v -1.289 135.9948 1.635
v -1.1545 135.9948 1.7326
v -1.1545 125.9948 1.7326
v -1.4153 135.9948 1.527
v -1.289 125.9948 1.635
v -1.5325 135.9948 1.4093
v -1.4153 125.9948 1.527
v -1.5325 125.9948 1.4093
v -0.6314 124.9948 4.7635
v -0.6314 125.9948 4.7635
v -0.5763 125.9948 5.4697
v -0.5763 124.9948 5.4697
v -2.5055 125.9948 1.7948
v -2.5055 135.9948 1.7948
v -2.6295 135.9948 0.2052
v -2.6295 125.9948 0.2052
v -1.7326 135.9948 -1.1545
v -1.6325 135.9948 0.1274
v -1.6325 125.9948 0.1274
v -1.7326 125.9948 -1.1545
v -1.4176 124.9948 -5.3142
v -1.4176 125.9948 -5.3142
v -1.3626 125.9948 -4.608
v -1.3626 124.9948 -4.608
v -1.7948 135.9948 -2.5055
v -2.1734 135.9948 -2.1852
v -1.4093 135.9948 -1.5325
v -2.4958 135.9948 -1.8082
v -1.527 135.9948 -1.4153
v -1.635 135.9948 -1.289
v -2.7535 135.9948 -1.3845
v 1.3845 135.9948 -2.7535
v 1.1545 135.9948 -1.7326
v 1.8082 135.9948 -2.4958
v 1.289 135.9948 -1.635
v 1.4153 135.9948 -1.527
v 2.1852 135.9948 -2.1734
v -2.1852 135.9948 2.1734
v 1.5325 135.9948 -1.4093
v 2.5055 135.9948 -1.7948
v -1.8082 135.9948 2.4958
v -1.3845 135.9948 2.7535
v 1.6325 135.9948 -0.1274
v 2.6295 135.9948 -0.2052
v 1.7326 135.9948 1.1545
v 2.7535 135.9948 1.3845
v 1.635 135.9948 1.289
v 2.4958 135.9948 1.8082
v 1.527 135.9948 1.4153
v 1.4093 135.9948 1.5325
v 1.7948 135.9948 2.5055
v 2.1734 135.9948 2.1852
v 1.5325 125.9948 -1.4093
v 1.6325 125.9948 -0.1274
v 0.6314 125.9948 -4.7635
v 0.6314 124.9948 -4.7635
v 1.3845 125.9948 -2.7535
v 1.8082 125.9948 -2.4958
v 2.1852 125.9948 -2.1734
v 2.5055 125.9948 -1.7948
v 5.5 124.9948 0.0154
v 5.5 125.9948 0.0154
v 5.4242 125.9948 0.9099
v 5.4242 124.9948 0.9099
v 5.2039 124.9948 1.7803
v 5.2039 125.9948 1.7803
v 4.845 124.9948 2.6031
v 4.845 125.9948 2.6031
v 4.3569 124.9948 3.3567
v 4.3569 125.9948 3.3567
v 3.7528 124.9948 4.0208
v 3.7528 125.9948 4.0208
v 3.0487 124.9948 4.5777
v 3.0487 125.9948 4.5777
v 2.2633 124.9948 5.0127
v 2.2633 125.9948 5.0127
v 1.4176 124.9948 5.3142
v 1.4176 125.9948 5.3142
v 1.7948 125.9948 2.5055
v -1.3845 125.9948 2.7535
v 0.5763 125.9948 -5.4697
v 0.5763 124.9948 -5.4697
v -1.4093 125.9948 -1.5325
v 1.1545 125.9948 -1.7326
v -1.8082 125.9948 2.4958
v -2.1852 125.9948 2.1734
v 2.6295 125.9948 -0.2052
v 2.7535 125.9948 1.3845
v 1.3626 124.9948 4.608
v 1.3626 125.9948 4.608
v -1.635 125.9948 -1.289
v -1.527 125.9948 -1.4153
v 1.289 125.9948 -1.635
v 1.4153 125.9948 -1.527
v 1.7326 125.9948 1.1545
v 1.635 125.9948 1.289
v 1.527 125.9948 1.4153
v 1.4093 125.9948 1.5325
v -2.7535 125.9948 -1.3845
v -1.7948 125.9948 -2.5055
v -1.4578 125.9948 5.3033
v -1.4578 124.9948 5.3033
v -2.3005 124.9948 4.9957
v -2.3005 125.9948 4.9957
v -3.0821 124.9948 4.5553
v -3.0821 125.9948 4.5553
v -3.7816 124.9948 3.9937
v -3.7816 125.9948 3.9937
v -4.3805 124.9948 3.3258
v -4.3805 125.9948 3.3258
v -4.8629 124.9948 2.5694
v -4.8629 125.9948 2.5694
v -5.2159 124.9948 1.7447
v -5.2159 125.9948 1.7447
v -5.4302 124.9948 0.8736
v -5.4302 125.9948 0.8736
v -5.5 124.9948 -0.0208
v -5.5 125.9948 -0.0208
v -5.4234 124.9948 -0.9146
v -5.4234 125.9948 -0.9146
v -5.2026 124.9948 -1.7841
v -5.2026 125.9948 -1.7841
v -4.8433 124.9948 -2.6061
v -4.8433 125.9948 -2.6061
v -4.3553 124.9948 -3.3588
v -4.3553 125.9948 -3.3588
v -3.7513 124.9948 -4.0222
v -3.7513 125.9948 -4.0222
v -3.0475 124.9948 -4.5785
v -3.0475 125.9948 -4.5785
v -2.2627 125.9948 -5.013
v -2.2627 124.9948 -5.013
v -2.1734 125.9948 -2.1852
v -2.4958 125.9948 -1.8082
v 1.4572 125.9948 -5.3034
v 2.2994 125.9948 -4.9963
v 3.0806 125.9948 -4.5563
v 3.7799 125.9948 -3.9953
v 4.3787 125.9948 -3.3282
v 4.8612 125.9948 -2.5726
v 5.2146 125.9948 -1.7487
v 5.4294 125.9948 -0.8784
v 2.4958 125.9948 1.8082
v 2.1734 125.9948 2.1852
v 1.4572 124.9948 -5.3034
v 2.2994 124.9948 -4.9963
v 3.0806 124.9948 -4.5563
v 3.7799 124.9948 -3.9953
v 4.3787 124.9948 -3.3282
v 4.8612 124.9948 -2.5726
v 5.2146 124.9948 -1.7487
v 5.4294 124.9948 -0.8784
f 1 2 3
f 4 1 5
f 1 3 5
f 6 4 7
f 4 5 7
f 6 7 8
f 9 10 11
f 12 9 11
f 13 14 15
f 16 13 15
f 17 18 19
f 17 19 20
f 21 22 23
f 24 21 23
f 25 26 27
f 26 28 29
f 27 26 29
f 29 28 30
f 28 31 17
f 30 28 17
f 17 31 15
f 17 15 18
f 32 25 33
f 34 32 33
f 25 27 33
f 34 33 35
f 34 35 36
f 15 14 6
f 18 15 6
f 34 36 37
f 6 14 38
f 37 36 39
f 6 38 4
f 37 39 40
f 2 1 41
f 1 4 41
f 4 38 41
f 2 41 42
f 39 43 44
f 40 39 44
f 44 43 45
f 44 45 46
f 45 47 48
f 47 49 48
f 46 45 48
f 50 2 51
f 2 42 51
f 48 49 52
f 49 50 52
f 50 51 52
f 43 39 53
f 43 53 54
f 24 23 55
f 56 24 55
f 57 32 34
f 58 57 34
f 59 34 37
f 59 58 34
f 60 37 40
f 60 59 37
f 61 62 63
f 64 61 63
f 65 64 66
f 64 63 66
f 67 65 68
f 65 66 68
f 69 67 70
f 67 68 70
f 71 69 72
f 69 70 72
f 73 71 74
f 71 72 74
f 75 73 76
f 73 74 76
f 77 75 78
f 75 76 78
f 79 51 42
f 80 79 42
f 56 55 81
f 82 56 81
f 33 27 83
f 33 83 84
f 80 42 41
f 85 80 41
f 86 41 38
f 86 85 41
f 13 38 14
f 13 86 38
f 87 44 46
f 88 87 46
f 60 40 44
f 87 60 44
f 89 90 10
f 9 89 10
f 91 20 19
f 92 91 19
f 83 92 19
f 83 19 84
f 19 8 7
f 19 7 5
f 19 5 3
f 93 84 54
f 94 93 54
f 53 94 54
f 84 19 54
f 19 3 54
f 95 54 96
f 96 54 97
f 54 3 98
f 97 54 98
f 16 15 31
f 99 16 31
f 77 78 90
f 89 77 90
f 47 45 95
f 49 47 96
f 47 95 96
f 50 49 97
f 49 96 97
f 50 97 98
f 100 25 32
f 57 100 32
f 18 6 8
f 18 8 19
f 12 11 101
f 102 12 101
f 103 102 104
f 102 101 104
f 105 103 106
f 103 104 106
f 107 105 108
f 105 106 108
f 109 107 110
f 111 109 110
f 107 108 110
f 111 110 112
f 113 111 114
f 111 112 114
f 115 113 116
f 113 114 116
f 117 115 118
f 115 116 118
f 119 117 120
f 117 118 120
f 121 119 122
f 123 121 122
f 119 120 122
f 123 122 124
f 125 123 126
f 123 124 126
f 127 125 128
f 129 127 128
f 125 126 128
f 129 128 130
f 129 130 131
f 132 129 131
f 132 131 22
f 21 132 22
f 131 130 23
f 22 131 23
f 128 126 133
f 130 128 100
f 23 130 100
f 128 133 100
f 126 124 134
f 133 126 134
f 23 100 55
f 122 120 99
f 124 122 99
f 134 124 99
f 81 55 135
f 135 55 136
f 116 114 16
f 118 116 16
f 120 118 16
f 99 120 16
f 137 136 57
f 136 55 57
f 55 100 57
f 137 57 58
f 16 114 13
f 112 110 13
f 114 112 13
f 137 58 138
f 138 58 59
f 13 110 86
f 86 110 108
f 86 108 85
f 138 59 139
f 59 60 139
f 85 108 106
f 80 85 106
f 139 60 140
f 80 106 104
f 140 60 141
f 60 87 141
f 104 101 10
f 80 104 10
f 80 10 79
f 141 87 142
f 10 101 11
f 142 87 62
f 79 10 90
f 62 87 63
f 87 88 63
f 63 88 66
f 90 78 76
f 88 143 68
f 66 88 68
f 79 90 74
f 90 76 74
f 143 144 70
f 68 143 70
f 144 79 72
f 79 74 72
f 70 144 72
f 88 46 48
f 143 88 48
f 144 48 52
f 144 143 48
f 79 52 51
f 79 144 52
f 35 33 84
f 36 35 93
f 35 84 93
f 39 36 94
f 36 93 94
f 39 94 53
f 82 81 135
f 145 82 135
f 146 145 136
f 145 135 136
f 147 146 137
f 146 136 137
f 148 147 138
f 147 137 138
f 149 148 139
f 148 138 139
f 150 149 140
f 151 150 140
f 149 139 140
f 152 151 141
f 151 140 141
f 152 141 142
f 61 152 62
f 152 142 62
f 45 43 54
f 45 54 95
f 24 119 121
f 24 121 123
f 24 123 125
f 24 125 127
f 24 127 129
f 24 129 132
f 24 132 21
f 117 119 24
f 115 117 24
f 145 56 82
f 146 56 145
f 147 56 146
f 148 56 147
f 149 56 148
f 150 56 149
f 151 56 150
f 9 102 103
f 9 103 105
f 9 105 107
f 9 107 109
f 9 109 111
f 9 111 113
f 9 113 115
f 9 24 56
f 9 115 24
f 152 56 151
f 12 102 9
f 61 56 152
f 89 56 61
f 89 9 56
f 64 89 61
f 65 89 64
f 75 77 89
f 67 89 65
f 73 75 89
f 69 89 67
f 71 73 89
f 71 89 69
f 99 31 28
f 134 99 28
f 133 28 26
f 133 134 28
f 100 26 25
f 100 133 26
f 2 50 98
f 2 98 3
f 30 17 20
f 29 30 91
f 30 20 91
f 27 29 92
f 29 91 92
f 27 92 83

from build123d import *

# Parameters (mm, degrees)
BOSS_EXTRUDE1_DEPTH = 1
BOSS_EXTRUDE2_DEPTH = 10


with BuildPart() as part:
    # Sketch1 → Boss-Extrude1 (new body)
    with BuildSketch(Plane(origin=(0, 125.994845224, 0), x_dir=(0.9999961031753525, 0, 0.0027917080989731807), z_dir=(0, -1, 0))):
        with BuildLine():
            Line((-0.618086487, 4.765287934), (-0.561019037, 5.471312241))
            ThreePointArc((-0.561019037, 5.471312241), (-5.482120778, 0.443115979), (-1.432479428, -5.310179158))
            Line((-1.432479428, -5.310179158), (-1.375411978, -4.604154851))
            Line((-1.375411978, -4.604154851), (0.618086487, -4.765287934))
            Line((0.618086487, -4.765287934), (0.561019037, -5.471312241))
            ThreePointArc((0.561019037, -5.471312241), (5.482120778, -0.443115979), (1.432479428, 5.310179158))
            Line((1.432479428, 5.310179158), (1.375411978, 4.604154851))
            Line((1.375411978, 4.604154851), (-0.618086487, 4.765287934))
        make_face()
    extrude(amount=BOSS_EXTRUDE1_DEPTH)

    # Sketch1<4> → Boss-Extrude2 (add)
    with BuildSketch(Plane(origin=(0, 125.994845224, 0), x_dir=(0.9999961031753525, 0, 0.0027917080989731807), z_dir=(0, -1, 0))):
        with BuildLine():
            ThreePointArc((-2.757386609, -1.376787234), (-2.347797606, -1.996639778), (-1.801775741, -2.500465592))
            Line((-1.801775741, -2.500465592), (1.376787234, -2.757386609))
            ThreePointArc((1.376787234, -2.757386609), (1.996639778, -2.347797606), (2.500465592, -1.801775741))
            Line((2.500465592, -1.801775741), (2.628926101, -0.212494254))
            Line((2.628926101, -0.212494254), (2.757386609, 1.376787234))
            ThreePointArc((2.757386609, 1.376787234), (2.347797606, 1.996639778), (1.801775741, 2.500465592))
            Line((1.801775741, 2.500465592), (-1.376787234, 2.757386609))
            ThreePointArc((-1.376787234, 2.757386609), (-1.996639778, 2.347797606), (-2.500465592, 1.801775741))
            Line((-2.500465592, 1.801775741), (-2.628926101, 0.212494254))
            Line((-2.628926101, 0.212494254), (-2.757386609, -1.376787234))
        make_face()
        with BuildLine():
            Line((1.735770459, 1.149706447), (1.632176868, -0.131927712))
            Line((1.632176868, -0.131927712), (1.528583278, -1.413561871))
            ThreePointArc((1.528583278, -1.413561871), (1.348800784, -1.586020316), (1.149706447, -1.735770459))
            Line((1.149706447, -1.735770459), (-1.413561871, -1.528583278))
            ThreePointArc((-1.413561871, -1.528583278), (-1.586020316, -1.348800784), (-1.735770459, -1.149706447))
            Line((-1.735770459, -1.149706447), (-1.632176868, 0.131927712))
            Line((-1.632176868, 0.131927712), (-1.528583278, 1.413561871))
            ThreePointArc((-1.528583278, 1.413561871), (-1.348800784, 1.586020316), (-1.149706447, 1.735770459))
            Line((-1.149706447, 1.735770459), (1.413561871, 1.528583278))
            ThreePointArc((1.413561871, 1.528583278), (1.586020316, 1.348800784), (1.735770459, 1.149706447))
        make_face(mode=Mode.SUBTRACT)
    extrude(amount=-BOSS_EXTRUDE2_DEPTH)


solid = part.part
